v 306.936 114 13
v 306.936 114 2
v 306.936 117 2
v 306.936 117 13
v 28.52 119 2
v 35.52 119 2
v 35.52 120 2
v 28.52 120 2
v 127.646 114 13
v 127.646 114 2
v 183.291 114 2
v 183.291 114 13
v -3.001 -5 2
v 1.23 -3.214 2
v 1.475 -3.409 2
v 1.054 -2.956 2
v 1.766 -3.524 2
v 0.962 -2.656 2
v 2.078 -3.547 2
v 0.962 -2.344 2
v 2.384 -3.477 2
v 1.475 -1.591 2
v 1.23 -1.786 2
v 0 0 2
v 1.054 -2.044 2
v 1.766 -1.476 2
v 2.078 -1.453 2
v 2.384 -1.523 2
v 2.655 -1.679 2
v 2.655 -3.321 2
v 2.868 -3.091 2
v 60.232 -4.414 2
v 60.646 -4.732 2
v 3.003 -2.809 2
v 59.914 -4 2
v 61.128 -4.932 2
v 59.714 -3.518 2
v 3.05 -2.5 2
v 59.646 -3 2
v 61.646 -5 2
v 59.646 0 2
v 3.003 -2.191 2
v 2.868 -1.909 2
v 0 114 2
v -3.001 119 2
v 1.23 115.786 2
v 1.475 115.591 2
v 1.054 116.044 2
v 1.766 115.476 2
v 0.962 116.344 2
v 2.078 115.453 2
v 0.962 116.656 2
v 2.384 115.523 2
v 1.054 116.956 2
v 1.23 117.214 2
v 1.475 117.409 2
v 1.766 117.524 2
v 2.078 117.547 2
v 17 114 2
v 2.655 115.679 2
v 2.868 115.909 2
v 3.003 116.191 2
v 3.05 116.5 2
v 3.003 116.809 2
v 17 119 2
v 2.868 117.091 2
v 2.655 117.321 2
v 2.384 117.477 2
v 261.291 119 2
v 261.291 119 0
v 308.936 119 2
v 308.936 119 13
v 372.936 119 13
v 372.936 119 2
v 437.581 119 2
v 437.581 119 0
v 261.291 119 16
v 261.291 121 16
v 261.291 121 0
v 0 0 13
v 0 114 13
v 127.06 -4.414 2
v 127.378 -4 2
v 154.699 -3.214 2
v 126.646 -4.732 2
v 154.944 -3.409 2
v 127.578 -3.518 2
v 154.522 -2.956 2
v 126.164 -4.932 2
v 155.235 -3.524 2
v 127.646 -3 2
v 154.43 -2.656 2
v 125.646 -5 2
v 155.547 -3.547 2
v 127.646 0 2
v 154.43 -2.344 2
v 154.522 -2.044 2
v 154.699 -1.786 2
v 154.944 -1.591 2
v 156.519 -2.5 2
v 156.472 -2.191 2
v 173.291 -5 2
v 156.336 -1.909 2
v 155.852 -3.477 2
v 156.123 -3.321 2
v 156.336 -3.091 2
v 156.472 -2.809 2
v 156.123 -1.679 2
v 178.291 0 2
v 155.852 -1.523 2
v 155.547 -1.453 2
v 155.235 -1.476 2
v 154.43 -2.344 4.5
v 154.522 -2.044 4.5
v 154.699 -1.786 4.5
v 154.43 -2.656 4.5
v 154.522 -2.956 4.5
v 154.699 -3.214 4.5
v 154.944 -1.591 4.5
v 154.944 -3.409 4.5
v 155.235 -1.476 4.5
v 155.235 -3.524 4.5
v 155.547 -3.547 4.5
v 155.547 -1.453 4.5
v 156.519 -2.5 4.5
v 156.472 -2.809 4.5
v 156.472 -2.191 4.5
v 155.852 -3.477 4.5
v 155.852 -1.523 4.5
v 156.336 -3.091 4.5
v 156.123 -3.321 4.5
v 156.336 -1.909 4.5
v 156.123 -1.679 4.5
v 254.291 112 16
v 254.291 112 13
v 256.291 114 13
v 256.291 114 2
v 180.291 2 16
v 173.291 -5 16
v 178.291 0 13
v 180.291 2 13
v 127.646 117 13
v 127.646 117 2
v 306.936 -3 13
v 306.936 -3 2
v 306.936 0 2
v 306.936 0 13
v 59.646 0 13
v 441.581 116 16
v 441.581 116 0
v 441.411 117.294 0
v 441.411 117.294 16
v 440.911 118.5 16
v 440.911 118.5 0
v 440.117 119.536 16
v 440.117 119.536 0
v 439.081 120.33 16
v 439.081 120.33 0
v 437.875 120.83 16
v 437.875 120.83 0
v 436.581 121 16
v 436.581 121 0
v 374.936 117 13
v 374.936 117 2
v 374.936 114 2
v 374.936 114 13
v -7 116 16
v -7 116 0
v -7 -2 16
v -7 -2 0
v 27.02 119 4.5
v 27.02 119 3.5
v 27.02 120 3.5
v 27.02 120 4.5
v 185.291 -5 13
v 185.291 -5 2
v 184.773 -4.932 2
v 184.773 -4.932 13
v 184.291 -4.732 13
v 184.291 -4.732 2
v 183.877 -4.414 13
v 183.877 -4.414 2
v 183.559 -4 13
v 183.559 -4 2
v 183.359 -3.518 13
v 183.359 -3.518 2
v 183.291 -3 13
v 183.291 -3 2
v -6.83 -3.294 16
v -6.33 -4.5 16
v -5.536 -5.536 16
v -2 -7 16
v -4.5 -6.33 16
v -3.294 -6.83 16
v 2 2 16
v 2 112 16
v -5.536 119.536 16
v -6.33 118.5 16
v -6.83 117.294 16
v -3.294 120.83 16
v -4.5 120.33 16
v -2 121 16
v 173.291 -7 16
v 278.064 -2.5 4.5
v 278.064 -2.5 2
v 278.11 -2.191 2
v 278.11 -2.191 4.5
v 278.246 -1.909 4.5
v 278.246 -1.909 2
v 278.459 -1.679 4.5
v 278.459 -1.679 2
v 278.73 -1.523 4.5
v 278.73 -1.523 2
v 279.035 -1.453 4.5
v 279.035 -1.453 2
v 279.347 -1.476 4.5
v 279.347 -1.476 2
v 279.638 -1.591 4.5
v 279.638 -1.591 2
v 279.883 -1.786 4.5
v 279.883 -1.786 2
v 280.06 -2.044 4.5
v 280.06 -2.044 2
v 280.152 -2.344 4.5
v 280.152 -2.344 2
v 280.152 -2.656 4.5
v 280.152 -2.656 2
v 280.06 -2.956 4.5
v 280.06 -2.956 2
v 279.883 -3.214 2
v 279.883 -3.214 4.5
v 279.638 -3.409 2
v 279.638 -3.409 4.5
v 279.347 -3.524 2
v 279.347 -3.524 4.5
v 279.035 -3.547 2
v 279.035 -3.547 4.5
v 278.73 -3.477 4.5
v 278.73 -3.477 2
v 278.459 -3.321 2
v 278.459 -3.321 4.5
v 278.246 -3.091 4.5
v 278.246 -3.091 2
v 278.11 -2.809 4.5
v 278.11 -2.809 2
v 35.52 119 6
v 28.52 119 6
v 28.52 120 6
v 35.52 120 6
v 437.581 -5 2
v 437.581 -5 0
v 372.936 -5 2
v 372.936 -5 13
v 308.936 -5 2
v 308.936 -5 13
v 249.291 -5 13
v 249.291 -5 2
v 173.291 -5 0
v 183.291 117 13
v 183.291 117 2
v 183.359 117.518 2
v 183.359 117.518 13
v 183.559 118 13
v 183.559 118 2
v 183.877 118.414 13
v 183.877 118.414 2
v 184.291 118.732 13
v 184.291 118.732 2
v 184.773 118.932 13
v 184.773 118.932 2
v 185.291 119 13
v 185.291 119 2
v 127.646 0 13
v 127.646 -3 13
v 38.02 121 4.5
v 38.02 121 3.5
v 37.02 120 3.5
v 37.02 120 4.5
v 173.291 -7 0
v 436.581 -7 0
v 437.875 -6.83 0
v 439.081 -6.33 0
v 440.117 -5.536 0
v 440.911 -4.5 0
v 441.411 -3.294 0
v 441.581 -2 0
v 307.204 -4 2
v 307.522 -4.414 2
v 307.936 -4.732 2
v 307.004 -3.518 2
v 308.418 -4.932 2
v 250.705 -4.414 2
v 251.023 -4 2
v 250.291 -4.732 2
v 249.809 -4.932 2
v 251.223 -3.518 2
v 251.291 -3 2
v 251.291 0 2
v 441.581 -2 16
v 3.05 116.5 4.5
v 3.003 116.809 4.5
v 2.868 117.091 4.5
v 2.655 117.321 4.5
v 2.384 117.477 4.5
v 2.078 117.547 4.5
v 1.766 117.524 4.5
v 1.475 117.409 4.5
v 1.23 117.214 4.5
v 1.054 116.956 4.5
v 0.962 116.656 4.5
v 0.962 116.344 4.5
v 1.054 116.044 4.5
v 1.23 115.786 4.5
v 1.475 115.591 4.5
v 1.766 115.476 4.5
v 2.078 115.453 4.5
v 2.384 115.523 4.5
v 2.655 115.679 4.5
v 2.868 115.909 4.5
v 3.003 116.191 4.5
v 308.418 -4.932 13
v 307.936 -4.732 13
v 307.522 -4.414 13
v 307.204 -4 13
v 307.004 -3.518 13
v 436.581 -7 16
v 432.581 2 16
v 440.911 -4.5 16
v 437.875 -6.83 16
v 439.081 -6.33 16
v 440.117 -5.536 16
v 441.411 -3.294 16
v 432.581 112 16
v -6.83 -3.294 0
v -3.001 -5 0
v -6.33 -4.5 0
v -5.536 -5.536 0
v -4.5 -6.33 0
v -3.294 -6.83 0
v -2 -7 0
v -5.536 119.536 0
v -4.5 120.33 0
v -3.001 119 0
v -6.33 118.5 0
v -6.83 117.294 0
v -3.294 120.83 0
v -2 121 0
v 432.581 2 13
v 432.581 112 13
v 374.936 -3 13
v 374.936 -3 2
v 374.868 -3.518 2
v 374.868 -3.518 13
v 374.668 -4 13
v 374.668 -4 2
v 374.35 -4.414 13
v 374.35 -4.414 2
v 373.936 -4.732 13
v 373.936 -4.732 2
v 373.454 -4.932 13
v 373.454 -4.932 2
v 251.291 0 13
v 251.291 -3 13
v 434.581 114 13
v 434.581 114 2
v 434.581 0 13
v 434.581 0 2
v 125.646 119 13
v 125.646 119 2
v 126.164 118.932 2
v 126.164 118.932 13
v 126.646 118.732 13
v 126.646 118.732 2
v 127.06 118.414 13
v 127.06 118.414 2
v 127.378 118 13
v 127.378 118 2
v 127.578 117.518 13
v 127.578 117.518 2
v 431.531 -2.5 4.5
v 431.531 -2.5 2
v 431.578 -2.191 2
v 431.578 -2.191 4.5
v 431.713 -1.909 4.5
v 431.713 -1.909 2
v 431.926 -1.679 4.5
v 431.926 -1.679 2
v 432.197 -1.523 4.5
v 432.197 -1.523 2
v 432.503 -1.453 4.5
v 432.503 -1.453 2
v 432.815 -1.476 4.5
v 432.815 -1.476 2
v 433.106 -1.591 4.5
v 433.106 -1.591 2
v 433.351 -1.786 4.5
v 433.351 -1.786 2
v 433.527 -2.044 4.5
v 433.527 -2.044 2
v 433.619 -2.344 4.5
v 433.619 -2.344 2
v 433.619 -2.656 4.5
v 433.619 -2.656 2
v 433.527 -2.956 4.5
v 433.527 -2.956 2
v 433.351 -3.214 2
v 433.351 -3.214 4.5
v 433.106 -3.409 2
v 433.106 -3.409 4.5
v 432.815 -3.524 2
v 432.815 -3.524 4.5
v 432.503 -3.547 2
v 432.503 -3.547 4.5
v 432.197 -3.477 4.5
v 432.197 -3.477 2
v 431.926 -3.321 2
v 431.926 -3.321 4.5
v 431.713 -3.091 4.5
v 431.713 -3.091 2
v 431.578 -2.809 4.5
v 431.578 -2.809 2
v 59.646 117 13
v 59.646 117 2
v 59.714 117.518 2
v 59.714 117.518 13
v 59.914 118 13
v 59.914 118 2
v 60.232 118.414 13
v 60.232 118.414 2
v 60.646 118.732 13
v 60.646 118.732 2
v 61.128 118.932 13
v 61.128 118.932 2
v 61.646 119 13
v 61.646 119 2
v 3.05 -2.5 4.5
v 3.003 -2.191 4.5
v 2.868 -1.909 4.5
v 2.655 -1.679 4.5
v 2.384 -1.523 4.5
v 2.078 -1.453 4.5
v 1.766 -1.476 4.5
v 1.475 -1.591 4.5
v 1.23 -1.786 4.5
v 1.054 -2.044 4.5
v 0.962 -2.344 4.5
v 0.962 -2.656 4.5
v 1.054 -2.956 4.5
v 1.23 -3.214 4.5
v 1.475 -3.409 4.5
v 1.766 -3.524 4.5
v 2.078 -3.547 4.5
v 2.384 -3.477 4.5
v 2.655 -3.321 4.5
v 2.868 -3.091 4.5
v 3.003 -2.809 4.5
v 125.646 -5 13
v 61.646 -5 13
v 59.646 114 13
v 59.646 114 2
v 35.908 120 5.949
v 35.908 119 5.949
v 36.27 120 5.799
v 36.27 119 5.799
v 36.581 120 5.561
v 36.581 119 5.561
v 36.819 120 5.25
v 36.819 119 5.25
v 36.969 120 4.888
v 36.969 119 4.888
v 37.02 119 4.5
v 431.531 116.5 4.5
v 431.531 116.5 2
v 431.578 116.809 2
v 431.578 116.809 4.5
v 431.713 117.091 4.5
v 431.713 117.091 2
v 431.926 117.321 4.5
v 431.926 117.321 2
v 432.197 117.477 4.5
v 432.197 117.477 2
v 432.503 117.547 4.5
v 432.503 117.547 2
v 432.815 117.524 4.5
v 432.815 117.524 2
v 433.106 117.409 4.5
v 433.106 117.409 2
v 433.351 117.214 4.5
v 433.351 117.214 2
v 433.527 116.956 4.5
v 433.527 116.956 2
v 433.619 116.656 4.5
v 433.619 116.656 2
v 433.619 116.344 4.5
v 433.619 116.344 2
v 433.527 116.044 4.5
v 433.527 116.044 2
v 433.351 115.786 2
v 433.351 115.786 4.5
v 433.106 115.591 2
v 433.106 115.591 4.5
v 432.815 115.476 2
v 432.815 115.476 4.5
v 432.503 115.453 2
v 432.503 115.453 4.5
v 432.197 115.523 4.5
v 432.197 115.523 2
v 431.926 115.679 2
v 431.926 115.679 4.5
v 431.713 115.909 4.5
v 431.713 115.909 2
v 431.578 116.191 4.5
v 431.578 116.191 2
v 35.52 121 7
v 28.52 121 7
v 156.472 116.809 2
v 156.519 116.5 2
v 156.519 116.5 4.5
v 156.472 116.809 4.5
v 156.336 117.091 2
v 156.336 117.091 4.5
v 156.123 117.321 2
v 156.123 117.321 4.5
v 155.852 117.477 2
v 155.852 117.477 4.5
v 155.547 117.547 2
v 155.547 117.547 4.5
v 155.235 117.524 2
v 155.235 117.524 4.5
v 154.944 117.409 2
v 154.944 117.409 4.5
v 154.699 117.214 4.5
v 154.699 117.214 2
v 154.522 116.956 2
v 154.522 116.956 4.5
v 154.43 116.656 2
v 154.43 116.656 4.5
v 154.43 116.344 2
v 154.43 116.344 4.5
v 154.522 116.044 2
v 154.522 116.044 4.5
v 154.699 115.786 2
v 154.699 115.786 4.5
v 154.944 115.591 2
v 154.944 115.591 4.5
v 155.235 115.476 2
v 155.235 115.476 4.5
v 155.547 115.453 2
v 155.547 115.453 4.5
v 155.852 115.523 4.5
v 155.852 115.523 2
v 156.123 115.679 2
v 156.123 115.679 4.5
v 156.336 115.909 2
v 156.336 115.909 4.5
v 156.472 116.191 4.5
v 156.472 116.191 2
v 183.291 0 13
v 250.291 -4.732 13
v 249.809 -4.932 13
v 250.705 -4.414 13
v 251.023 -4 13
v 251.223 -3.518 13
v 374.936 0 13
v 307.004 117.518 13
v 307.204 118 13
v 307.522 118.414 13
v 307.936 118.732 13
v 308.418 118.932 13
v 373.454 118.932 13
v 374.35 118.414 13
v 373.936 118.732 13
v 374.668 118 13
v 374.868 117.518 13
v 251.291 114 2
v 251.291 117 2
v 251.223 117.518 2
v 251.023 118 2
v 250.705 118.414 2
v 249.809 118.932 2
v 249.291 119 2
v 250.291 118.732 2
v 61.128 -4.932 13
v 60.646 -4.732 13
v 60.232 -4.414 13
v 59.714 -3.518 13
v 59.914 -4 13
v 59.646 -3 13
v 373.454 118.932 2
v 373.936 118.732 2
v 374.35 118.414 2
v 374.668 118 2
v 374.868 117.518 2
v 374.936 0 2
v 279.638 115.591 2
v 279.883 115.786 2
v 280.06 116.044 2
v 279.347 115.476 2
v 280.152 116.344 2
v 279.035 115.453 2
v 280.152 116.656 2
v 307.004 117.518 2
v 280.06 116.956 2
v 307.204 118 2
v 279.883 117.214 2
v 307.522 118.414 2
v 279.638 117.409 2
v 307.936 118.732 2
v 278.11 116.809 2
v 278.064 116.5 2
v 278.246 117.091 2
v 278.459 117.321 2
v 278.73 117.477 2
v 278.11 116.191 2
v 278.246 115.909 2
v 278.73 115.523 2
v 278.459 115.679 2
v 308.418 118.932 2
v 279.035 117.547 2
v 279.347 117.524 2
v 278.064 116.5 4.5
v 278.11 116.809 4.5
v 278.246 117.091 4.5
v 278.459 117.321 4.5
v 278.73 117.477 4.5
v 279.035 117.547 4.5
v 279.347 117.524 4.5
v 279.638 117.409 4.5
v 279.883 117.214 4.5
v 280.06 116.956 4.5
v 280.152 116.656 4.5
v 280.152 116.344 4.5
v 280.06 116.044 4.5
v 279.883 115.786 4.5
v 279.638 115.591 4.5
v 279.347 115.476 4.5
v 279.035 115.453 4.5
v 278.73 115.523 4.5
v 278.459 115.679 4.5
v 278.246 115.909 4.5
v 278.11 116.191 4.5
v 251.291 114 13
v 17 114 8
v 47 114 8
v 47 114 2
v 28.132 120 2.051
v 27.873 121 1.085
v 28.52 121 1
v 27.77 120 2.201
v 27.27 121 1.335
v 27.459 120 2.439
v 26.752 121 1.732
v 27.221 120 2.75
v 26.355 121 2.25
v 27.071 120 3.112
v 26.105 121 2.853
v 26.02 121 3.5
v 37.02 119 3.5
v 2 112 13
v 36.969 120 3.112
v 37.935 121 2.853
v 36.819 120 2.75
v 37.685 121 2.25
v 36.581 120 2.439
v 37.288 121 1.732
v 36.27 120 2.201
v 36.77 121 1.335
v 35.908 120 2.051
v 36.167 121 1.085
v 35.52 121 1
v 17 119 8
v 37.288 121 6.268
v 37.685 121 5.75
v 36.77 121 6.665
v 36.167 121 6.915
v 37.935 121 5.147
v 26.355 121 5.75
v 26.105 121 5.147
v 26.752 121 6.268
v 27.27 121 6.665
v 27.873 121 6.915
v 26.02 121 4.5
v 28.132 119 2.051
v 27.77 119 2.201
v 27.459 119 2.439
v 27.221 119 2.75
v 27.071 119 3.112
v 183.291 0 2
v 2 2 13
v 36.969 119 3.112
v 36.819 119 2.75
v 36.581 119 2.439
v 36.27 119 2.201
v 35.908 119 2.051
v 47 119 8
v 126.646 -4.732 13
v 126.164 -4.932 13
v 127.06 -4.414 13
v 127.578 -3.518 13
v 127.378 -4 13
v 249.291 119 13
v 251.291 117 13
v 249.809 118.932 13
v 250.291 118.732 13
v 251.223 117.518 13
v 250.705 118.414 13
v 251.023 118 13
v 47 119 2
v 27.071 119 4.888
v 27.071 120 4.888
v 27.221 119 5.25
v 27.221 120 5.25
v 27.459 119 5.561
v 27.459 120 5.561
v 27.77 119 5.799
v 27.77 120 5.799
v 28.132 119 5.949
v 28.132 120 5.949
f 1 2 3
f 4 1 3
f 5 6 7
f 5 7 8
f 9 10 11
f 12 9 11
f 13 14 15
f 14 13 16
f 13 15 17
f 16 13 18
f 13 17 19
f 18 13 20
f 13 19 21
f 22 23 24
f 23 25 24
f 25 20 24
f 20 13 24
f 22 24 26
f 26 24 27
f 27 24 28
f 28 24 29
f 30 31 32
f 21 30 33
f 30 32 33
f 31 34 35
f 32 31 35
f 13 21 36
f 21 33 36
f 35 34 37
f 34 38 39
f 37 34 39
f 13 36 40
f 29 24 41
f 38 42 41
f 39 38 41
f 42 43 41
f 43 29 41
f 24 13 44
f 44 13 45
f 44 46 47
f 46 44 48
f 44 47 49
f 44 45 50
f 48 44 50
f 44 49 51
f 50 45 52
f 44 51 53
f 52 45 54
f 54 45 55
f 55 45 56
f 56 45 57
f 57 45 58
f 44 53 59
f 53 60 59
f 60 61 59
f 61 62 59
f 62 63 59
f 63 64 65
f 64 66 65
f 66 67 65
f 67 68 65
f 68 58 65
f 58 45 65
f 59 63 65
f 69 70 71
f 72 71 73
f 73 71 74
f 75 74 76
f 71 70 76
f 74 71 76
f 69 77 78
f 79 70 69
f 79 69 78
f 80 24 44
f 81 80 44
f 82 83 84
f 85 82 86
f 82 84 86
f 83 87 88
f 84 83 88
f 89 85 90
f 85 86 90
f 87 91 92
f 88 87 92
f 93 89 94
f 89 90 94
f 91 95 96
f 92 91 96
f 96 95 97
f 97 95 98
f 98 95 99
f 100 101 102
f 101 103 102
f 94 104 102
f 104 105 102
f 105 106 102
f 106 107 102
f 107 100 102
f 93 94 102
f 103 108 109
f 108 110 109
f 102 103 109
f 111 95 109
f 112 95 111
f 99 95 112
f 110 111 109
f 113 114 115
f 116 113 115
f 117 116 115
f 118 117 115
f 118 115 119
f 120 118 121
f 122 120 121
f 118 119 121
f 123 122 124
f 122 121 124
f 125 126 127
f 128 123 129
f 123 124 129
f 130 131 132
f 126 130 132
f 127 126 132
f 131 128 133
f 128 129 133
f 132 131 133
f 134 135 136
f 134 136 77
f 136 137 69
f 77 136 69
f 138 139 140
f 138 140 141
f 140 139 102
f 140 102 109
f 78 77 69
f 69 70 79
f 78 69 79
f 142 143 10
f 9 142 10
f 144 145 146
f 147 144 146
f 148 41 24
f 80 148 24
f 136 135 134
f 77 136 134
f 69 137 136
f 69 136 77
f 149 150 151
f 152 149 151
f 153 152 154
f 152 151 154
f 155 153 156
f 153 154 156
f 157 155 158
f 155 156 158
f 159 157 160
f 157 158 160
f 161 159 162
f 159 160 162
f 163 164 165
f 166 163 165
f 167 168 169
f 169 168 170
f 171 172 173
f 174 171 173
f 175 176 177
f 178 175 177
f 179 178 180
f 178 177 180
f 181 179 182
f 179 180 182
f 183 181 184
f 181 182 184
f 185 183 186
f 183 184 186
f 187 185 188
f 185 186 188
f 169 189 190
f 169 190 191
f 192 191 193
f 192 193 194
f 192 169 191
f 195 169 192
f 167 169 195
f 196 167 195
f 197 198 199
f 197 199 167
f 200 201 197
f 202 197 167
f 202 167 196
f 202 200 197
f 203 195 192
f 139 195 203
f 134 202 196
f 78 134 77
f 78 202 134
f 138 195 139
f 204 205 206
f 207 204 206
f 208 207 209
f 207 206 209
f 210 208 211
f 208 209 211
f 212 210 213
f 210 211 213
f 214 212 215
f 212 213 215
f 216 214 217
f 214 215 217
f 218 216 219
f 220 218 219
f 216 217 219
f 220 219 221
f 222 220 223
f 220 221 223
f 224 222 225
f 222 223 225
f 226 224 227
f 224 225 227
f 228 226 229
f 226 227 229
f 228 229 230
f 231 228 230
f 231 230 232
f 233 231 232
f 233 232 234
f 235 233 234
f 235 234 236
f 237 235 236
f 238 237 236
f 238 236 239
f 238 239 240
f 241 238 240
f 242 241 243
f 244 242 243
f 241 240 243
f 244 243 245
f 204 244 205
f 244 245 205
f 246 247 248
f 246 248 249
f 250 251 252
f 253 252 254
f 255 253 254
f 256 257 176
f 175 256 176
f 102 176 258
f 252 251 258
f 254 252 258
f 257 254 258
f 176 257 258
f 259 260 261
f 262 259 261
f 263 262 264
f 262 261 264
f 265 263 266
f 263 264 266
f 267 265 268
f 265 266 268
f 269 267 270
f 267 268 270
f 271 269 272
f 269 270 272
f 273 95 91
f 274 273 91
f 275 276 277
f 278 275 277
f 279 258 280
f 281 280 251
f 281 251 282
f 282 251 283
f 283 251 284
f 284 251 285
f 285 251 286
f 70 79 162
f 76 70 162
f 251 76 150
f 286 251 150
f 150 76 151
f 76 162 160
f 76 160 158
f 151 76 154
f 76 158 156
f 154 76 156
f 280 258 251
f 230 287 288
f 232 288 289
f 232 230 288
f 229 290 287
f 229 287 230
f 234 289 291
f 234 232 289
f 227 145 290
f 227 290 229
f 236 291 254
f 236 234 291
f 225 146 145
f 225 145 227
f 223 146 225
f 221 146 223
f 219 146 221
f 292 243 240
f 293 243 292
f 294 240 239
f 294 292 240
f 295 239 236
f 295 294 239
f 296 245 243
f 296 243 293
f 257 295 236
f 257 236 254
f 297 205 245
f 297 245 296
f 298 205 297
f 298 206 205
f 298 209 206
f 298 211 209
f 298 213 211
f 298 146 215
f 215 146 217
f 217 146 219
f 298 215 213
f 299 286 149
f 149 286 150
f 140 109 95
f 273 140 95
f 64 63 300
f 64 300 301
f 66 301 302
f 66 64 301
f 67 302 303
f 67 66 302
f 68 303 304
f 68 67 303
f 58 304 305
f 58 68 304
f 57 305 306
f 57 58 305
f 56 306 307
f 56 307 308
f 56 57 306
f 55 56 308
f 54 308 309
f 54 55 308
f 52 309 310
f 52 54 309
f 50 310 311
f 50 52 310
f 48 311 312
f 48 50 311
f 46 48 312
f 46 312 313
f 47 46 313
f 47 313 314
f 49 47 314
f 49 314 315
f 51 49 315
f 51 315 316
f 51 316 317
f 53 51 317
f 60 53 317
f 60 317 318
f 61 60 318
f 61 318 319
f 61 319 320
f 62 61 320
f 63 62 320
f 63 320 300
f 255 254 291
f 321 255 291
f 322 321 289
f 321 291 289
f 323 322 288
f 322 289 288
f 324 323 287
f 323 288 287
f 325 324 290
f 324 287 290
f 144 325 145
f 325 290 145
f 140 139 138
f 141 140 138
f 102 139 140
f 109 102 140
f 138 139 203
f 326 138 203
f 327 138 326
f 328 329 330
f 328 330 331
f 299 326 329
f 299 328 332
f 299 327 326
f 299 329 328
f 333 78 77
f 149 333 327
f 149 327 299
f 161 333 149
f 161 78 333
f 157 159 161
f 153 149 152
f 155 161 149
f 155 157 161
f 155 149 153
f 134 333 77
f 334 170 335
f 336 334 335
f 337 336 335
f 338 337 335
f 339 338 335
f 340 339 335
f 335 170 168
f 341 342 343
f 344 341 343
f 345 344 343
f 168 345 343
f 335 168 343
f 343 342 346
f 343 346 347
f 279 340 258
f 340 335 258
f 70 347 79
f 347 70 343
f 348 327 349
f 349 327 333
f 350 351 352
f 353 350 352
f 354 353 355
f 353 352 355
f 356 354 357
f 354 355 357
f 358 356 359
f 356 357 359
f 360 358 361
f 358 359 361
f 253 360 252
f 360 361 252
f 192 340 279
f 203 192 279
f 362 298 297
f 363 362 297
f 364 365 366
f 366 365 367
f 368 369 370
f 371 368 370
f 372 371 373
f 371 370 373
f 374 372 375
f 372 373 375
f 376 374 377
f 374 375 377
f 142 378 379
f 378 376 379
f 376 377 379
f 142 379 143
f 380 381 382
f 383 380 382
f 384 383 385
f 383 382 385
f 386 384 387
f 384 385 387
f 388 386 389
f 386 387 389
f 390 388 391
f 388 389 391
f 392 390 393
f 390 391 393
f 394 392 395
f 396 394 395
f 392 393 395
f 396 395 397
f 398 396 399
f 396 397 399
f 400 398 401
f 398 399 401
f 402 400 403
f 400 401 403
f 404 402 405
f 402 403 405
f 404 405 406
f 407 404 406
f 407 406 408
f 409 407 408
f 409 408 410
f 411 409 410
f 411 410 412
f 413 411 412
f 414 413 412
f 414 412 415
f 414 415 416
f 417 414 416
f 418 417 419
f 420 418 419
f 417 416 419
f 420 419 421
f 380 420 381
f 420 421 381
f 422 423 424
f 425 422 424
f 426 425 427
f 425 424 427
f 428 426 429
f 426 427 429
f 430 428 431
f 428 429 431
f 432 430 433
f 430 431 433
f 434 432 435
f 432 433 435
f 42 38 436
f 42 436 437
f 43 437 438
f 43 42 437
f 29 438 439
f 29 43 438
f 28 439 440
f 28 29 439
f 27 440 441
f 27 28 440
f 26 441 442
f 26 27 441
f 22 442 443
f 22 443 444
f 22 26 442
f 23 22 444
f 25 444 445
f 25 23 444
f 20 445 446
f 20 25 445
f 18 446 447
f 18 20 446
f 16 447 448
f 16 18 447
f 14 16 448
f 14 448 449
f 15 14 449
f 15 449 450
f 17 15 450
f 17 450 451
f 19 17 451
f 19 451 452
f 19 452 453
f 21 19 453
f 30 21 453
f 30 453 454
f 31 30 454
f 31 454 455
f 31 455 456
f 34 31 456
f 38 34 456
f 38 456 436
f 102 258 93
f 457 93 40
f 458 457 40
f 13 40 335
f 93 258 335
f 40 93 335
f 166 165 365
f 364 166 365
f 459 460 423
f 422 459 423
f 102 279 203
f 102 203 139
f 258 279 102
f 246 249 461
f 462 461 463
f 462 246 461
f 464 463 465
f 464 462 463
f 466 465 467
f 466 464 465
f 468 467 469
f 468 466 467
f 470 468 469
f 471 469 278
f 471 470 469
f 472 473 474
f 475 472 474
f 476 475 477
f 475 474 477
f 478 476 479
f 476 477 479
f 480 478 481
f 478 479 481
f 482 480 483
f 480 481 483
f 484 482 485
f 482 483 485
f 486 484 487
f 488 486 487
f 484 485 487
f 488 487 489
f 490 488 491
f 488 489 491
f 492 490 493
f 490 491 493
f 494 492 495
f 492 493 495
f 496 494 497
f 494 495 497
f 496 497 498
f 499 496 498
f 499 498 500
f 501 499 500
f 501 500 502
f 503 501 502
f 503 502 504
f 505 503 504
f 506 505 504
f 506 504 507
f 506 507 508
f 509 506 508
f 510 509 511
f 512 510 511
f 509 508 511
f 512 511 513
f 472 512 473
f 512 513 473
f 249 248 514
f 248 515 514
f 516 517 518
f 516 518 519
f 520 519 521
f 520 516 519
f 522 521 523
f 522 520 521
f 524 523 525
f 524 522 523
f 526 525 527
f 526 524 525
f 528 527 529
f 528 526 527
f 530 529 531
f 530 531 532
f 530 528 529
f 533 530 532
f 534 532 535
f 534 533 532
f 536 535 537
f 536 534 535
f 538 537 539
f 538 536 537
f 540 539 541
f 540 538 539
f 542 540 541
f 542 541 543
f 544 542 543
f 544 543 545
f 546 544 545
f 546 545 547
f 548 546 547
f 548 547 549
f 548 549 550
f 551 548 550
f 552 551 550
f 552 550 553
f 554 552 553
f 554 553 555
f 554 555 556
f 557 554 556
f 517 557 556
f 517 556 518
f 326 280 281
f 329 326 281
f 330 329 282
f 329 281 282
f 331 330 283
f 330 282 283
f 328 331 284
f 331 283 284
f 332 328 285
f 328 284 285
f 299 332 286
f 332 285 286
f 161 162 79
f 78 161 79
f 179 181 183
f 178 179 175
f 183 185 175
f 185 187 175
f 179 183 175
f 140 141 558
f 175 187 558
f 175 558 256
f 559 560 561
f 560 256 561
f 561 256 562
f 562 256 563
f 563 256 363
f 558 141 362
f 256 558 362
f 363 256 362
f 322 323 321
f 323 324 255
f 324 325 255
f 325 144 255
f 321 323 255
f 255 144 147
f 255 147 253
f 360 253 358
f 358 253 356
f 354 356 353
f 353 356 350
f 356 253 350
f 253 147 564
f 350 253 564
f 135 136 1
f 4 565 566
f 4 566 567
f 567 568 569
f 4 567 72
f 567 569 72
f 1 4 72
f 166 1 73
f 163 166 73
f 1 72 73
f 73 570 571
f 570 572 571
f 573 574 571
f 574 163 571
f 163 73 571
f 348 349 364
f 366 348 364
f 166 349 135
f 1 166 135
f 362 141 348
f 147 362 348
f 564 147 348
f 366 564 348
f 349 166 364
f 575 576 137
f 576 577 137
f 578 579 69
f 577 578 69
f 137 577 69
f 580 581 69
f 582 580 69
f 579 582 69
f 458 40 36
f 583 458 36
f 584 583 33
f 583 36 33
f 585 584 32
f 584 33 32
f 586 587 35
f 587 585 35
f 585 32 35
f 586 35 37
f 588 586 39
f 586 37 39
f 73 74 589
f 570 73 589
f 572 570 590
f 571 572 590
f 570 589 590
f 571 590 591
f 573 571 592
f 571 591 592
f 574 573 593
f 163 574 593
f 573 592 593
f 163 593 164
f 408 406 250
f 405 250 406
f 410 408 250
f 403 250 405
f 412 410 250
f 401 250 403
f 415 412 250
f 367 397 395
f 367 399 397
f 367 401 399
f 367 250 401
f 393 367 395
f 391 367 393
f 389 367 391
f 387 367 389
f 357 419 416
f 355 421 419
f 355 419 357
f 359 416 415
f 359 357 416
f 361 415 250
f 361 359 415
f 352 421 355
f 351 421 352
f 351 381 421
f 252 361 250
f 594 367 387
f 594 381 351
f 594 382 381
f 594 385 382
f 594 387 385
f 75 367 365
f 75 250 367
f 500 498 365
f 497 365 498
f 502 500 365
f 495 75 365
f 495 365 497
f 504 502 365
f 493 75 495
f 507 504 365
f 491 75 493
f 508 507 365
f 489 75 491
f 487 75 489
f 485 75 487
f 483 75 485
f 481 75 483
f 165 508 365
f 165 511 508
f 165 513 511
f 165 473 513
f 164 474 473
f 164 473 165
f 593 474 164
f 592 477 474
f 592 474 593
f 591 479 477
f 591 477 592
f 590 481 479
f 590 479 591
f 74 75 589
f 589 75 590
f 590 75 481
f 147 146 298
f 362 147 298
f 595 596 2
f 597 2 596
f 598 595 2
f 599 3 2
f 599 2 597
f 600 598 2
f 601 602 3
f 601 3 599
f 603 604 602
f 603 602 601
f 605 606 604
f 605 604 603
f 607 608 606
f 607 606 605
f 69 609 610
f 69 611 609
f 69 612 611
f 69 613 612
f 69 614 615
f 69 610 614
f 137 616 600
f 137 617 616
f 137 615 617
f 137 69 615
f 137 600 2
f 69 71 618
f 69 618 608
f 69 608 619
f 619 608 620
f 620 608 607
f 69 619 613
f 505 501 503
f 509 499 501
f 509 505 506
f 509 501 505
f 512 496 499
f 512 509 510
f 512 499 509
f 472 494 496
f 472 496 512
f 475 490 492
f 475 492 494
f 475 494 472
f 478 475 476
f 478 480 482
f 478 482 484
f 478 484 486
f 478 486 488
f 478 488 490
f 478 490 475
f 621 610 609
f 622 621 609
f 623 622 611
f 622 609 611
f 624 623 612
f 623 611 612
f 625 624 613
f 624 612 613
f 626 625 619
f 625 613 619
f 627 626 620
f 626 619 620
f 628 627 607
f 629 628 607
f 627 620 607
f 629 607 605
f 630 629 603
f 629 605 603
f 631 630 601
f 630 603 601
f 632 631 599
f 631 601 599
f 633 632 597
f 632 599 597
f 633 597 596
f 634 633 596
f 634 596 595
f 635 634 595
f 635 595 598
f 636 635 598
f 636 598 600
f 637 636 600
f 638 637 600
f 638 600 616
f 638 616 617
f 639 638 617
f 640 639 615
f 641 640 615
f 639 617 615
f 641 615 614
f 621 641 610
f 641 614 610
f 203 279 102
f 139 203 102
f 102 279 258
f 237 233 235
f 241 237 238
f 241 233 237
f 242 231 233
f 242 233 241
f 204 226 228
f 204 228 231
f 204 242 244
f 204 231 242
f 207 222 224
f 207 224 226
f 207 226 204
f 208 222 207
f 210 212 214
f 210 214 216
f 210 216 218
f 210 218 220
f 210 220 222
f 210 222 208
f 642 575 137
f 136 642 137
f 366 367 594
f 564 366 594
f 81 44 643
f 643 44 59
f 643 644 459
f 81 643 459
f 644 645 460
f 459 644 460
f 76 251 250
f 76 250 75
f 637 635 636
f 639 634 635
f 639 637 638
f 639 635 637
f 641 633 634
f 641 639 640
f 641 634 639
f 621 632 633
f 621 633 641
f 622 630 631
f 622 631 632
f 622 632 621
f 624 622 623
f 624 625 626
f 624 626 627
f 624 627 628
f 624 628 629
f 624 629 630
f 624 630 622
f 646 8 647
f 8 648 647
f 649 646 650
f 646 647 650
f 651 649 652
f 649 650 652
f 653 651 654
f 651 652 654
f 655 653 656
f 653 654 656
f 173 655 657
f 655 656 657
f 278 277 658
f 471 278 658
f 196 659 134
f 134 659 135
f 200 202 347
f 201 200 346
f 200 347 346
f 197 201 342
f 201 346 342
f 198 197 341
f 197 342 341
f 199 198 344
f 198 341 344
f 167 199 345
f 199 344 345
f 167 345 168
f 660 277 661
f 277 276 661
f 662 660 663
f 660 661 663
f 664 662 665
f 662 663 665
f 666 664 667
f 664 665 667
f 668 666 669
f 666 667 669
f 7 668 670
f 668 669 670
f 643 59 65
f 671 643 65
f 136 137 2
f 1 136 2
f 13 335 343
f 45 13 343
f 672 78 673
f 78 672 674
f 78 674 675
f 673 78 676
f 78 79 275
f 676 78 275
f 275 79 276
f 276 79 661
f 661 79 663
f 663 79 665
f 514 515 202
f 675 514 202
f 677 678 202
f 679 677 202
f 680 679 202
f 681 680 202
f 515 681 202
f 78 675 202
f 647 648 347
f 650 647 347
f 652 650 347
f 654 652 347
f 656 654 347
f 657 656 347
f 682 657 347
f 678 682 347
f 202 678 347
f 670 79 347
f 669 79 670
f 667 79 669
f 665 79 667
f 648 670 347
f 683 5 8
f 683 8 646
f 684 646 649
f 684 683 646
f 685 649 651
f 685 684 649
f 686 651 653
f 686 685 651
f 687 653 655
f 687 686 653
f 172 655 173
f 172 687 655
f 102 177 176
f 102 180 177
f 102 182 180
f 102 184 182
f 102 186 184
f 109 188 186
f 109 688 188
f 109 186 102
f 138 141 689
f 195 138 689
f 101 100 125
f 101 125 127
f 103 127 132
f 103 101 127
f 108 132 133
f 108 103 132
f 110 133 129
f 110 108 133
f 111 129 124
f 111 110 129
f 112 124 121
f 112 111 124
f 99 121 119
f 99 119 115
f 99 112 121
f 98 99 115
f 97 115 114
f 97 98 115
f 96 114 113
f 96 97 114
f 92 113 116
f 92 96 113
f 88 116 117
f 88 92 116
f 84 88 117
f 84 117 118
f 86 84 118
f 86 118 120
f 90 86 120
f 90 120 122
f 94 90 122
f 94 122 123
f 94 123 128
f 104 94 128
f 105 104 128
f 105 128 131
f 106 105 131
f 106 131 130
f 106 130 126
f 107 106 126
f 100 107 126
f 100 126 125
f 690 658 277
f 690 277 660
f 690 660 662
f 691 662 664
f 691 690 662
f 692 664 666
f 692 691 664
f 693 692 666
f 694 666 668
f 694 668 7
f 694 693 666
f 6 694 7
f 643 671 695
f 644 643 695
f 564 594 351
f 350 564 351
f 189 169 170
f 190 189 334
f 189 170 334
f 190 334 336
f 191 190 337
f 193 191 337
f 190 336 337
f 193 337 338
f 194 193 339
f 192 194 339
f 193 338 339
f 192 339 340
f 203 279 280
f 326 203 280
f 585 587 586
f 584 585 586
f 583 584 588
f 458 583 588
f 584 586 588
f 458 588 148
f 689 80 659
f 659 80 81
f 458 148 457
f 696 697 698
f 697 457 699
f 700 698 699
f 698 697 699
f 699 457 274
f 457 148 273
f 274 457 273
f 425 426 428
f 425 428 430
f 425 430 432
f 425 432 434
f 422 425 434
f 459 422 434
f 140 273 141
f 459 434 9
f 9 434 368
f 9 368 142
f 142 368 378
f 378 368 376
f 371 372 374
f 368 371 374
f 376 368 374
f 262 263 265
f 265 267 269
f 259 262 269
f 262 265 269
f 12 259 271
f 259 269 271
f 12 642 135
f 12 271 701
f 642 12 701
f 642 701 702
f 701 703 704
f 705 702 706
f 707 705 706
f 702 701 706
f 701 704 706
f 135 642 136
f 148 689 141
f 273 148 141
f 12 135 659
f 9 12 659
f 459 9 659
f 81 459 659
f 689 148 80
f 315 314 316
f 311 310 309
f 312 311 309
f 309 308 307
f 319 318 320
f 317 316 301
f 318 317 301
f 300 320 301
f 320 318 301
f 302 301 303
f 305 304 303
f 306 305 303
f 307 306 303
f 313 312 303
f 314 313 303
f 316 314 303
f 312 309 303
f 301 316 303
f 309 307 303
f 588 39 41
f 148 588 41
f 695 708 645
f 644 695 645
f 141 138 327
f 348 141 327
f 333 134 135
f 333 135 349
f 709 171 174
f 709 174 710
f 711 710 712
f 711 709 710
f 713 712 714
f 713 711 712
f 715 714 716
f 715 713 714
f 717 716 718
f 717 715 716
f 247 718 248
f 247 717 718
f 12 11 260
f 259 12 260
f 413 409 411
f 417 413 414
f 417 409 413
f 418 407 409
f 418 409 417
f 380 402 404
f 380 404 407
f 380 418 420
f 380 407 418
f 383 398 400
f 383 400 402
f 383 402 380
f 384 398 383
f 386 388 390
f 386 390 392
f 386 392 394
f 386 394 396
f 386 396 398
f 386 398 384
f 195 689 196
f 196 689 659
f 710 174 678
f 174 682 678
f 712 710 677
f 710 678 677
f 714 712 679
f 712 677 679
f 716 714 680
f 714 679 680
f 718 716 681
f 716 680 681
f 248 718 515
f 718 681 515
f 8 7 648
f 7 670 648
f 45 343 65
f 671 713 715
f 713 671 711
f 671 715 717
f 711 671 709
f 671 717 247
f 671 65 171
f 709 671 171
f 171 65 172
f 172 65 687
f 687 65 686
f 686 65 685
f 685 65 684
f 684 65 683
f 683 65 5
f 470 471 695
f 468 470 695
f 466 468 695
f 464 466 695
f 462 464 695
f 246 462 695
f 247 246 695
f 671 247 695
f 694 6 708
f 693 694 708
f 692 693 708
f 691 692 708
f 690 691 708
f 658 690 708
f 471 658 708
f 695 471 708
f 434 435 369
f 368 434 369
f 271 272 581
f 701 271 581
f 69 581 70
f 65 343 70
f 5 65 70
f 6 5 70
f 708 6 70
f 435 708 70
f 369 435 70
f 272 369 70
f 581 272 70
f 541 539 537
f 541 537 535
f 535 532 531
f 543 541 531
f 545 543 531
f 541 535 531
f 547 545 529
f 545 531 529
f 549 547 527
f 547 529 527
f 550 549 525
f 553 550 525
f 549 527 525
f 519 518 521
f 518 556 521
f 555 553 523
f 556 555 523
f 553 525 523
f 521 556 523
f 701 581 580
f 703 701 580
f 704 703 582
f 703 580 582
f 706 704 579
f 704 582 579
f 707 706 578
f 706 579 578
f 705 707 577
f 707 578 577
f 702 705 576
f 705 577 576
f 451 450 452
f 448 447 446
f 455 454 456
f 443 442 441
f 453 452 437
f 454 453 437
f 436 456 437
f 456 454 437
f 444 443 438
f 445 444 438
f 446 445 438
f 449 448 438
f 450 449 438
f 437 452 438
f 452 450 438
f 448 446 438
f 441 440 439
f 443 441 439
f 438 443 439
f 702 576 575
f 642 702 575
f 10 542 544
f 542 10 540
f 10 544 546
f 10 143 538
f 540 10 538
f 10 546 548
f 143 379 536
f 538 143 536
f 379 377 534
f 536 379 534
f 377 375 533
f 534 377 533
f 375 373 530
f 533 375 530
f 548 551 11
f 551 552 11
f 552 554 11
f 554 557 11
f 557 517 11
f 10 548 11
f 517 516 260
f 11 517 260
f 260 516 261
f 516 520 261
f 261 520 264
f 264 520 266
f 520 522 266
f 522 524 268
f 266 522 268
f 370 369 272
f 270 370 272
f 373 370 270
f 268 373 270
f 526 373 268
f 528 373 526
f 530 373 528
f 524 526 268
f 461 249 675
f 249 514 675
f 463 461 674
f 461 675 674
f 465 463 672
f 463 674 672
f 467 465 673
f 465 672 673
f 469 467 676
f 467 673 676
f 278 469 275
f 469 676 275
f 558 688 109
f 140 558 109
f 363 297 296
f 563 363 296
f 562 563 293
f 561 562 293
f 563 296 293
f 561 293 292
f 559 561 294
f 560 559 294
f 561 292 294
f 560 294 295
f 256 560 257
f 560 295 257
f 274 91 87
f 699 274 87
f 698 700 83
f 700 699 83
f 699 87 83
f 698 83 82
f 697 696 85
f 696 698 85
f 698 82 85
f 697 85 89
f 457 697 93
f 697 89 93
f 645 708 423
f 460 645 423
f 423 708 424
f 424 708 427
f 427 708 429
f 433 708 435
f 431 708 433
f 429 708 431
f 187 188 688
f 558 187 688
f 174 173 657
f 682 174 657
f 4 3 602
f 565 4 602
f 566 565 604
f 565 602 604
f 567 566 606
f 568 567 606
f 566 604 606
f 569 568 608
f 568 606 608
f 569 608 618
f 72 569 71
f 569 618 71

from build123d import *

# Parameters (mm, degrees)
BOSS_EXTRUDE1_DEPTH = 16
SKETCH2_W           = 438.581
SKETCH2_H           = 128
SKETCH2_W_2         = 430.581
SKETCH2_H_2         = 110
BOSS_EXTRUDE2_DEPTH = 3
SKETCH3_W           = 440.5822769
SKETCH3_H           = 124
CUT_EXTRUDE1_DEPTH  = 2
SKETCH4_R           = 1.05
CUT_EXTRUDE2_DEPTH  = 2.5
SKETCH5_W           = 30
SKETCH5_H           = 5
CUT_EXTRUDE3_DEPTH  = 6
CUT_EXTRUDE4_DEPTH  = 4
CHAMFER8_SIZE       = 1
SPLIT1_DEPTH        = 16
SPLIT1_START        = 2
SPLIT1_2_OUTLINE_R  = 1.05
SPLIT1_2_DEPTH      = 14
SPLIT1_START_2      = 13
SPLIT1_3_OUTLINE_R  = 1.05
SPLIT1_3_DEPTH      = 3
SPLIT1_4_DEPTH      = 3.5
SPLIT1_START_3      = 8
SPLIT1_5_OUTLINE_R  = 1.05
SPLIT1_5_DEPTH      = 5
SPLIT1_START_4      = 4.5
SPLIT1_6_OUTLINE_R  = 1.05
SPLIT1_6_DEPTH      = 3.5
SPLIT1_START_5      = 118
SPLIT1_7_DEPTH      = 4


with BuildPart() as part:
    # Sketch1 → Boss-Extrude1 (new body)
    with BuildSketch(Plane.XY):
        with BuildLine():
            ThreePointArc((-7, -2), (-5.535533906, -5.535533906), (-2, -7))
            Line((-2, -7), (436.581, -7))
            ThreePointArc((436.581, -7), (440.116533906, -5.535533906), (441.581, -2))
            Line((441.581, -2), (441.581, 116))
            ThreePointArc((441.581, 116), (440.116533906, 119.535533906), (436.581, 121))
            Line((436.581, 121), (-2, 121))
            ThreePointArc((-2, 121), (-5.535533906, 119.535533906), (-7, 116))
            Line((-7, 116), (-7, -2))
        make_face()
        with BuildLine():
            Line((251.291, 114), (306.936, 114))
            Line((306.936, 114), (306.936, 117))
            ThreePointArc((306.936, 117), (307.521786438, 118.414213562), (308.936, 119))
            Line((308.936, 119), (372.936, 119))
            ThreePointArc((372.936, 119), (374.350213562, 118.414213562), (374.936, 117))
            Line((374.936, 117), (374.936, 114))
            Line((374.936, 114), (434.581, 114))
            Line((434.581, 114), (434.581, 0))
            Line((434.581, 0), (374.936, 0))
            Line((374.936, 0), (374.936, -3))
            ThreePointArc((374.936, -3), (374.350213562, -4.414213562), (372.936, -5))
            Line((372.936, -5), (308.936, -5))
            ThreePointArc((308.936, -5), (307.521786438, -4.414213562), (306.936, -3))
            Line((306.936, -3), (306.936, 0))
            Line((306.936, 0), (251.291, 0))
            Line((251.291, 0), (251.291, -3))
            ThreePointArc((251.291, -3), (250.705213562, -4.414213562), (249.291, -5))
            Line((249.291, -5), (185.291, -5))
            ThreePointArc((185.291, -5), (183.876786438, -4.414213562), (183.291, -3))
            Line((183.291, -3), (183.291, 0))
            Line((183.291, 0), (127.646, 0))
            Line((127.646, 0), (127.646, -3))
            ThreePointArc((127.646, -3), (127.060213562, -4.414213562), (125.646, -5))
            Line((125.646, -5), (61.646, -5))
            ThreePointArc((61.646, -5), (60.231786438, -4.414213562), (59.646, -3))
            Line((59.646, -3), (59.646, 0))
            Line((59.646, 0), (0, 0))
            Line((0, 0), (0, 114))
            Line((0, 114), (59.646, 114))
            Line((59.646, 114), (59.646, 117))
            ThreePointArc((59.646, 117), (60.231786438, 118.414213562), (61.646, 119))
            Line((61.646, 119), (125.646, 119))
            ThreePointArc((125.646, 119), (127.060213562, 118.414213562), (127.646, 117))
            Line((127.646, 117), (127.646, 114))
            Line((127.646, 114), (183.291, 114))
            Line((183.291, 114), (183.291, 117))
            ThreePointArc((183.291, 117), (183.876786438, 118.414213562), (185.291, 119))
            Line((185.291, 119), (249.291, 119))
            ThreePointArc((249.291, 119), (250.705213562, 118.414213562), (251.291, 117))
            Line((251.291, 117), (251.291, 114))
        make_face(mode=Mode.SUBTRACT)
    extrude(amount=BOSS_EXTRUDE1_DEPTH)

    # Sketch2 → Boss-Extrude2 (add)
    with BuildSketch(Plane.XY.offset(16)):
        with Locations((217.2905, 57)):
            Rectangle(SKETCH2_W, SKETCH2_H)
        with Locations((217.2905, 57)):
            Rectangle(SKETCH2_W_2, SKETCH2_H_2, mode=Mode.SUBTRACT)
    extrude(amount=-BOSS_EXTRUDE2_DEPTH)

    # Sketch3 → Cut-Extrude1 (cut)
    with BuildSketch(Plane(origin=(0, 0, 0), x_dir=(-1, 0, 0), z_dir=(0, 0, -1))):
        with Locations((-217.28986155, 57)):
            Rectangle(SKETCH3_W, SKETCH3_H)
    extrude(amount=-CUT_EXTRUDE1_DEPTH, mode=Mode.SUBTRACT)

    # Sketch4 → Cut-Extrude2 (cut)
    with BuildSketch(Plane(origin=(0, 0, 2), x_dir=(-1, 0, 0), z_dir=(0, 0, -1))):
        with Locations((-279.1135, 116.5)):
            Circle(SKETCH4_R)
        with Locations((-155.4685, 116.5)):
            Circle(SKETCH4_R)
        with Locations((-279.1135, -2.5)):
            Circle(SKETCH4_R)
        with Locations((-155.4685, -2.5)):
            Circle(SKETCH4_R)
        with Locations((-2, -2.5)):
            Circle(SKETCH4_R)
        with Locations((-2, 116.5)):
            Circle(SKETCH4_R)
        with Locations((-432.581, 116.5)):
            Circle(SKETCH4_R)
        with Locations((-432.581, -2.5)):
            Circle(SKETCH4_R)
    extrude(amount=-CUT_EXTRUDE2_DEPTH, mode=Mode.SUBTRACT)

    # Sketch5 → Cut-Extrude3 (cut)
    with BuildSketch(Plane(origin=(0, 0, 2), x_dir=(-1, 0, 0), z_dir=(0, 0, -1))):
        with Locations((-32, 116.5)):
            Rectangle(SKETCH5_W, SKETCH5_H)
    extrude(amount=-CUT_EXTRUDE3_DEPTH, mode=Mode.SUBTRACT)

    # Sketch6 → Cut-Extrude4 (cut)
    with BuildSketch(Plane.XZ.offset(-119)):
        with BuildLine():
            Line((35.52, 2), (28.52, 2))
            ThreePointArc((28.52, 2), (27.459339828, 2.439339828), (27.02, 3.5))
            Line((27.02, 3.5), (27.02, 4.5))
            ThreePointArc((27.02, 4.5), (27.459339828, 5.560660172), (28.52, 6))
            Line((28.52, 6), (35.52, 6))
            ThreePointArc((35.52, 6), (36.580660172, 5.560660172), (37.02, 4.5))
            Line((37.02, 4.5), (37.02, 3.5))
            ThreePointArc((37.02, 3.5), (36.580660172, 2.439339828), (35.52, 2))
        make_face()
    extrude(amount=-CUT_EXTRUDE4_DEPTH, mode=Mode.SUBTRACT)

    # Chamfer8
    chamfer8_edges = [part.edges().sort_by_distance(p)[0] for p in [
        (32.02, 121, 6),
        (27.459339828, 121, 5.560660172),
        (27.02, 121, 4),
        (27.459339828, 121, 2.439339828),
        (32.02, 121, 2),
        (36.580660172, 121, 2.439339828),
        (37.02, 121, 4),
        (36.580660172, 121, 5.560660172),
    ]]
    chamfer(chamfer8_edges, length=CHAMFER8_SIZE)

    # Split1: read off the stored shape, not the designer's step
    # Split1 outline → Split1 (cut)
    with BuildSketch(Plane.XY):
        with BuildLine():
            Line((261.291, 121), (-2, 121))
            ThreePointArc((-2, 121), (-5.535533906, 119.535533906), (-7, 116))
            Line((-7, 116), (-7, -2))
            ThreePointArc((-7, -2), (-5.535533906, -5.535533906), (-2, -7))
            Line((-2, -7), (173.291, -7))
            Line((173.291, -7), (173.291, -5))
            Line((173.291, -5), (180.291, 2))
            Line((180.291, 2), (2, 2))
            Line((2, 2), (2, 112))
            Line((2, 112), (254.291, 112))
            Line((254.291, 112), (261.291, 119))
            Line((261.291, 119), (261.291, 121))
        make_face()
    extrude(amount=SPLIT1_DEPTH, mode=Mode.SUBTRACT)


with BuildPart() as body_2:
    # Split1 2 outline → Split1 2 (new body)
    # profile 1 of 2: a face of its own
    with BuildSketch(Plane.XY.offset(SPLIT1_START)):
        with BuildLine():
            ThreePointArc((127.646, -3), (127.060213562, -4.414213562), (125.646, -5))
            Line((125.646, -5), (61.646, -5))
            ThreePointArc((61.646, -5), (60.231786438, -4.414213562), (59.646, -3))
            Line((59.646, -3), (59.646, 0))
            Line((59.646, 0), (0, 0))
            Line((0, 0), (0, 114))
            Line((0, 114), (17, 114))
            Line((17, 114), (17, 119))
            Line((17, 119), (27.02, 119))
            Line((27.02, 119), (27.02, 120))
            Line((27.02, 120), (26.02, 121))
            Line((26.02, 121), (-2, 121))
            ThreePointArc((-2, 121), (-5.535533906, 119.535533906), (-7, 116))
            Line((-7, 116), (-7, -2))
            ThreePointArc((-7, -2), (-5.535533906, -5.535533906), (-2, -7))
            Line((-2, -7), (173.291, -7))
            Line((173.291, -7), (173.291, -5))
            Line((173.291, -5), (178.291, 0))
            Line((178.291, 0), (127.646, 0))
            Line((127.646, 0), (127.646, -3))
        make_face()
        with Locations((155.4685, -2.5)):
            Circle(SPLIT1_2_OUTLINE_R, mode=Mode.SUBTRACT)
        with Locations((2, -2.5)):
            Circle(SPLIT1_2_OUTLINE_R, mode=Mode.SUBTRACT)
        with Locations((2, 116.5)):
            Circle(SPLIT1_2_OUTLINE_R, mode=Mode.SUBTRACT)
    # profile 2 of 2: a face of its own
    with BuildSketch(Plane.XY.offset(SPLIT1_START)):
        with BuildLine():
            Line((251.291, 114), (256.291, 114))
            Line((256.291, 114), (261.291, 119))
            Line((261.291, 119), (261.291, 121))
            Line((261.291, 121), (38.02, 121))
            Line((38.02, 121), (37.02, 120))
            Line((37.02, 120), (37.02, 119))
            Line((37.02, 119), (47, 119))
            Line((47, 119), (47, 114))
            Line((47, 114), (59.646, 114))
            Line((59.646, 114), (59.646, 117))
            ThreePointArc((59.646, 117), (60.231786438, 118.414213562), (61.646, 119))
            Line((61.646, 119), (125.646, 119))
            ThreePointArc((125.646, 119), (127.060213562, 118.414213562), (127.646, 117))
            Line((127.646, 117), (127.646, 114))
            Line((127.646, 114), (183.291, 114))
            Line((183.291, 114), (183.291, 117))
            ThreePointArc((183.291, 117), (183.876786438, 118.414213562), (185.291, 119))
            Line((185.291, 119), (249.291, 119))
            ThreePointArc((249.291, 119), (250.705213562, 118.414213562), (251.291, 117))
            Line((251.291, 117), (251.291, 114))
        make_face()
        with Locations((155.4685, 116.5)):
            Circle(SPLIT1_2_OUTLINE_R, mode=Mode.SUBTRACT)
    extrude(amount=SPLIT1_2_DEPTH)

    # Split1 3 outline → Split1 3 (add)
    with BuildSketch(Plane.XY.offset(SPLIT1_START_2)):
        with BuildLine():
            Line((127.646, 0), (178.291, 0))
            Line((178.291, 0), (180.291, 2))
            Line((180.291, 2), (2, 2))
            Line((2, 2), (2, 112))
            Line((2, 112), (254.291, 112))
            Line((254.291, 112), (256.291, 114))
            Line((256.291, 114), (251.291, 114))
            Line((251.291, 114), (251.291, 117))
            ThreePointArc((251.291, 117), (250.705213562, 118.414213562), (249.291, 119))
            Line((249.291, 119), (185.291, 119))
            ThreePointArc((185.291, 119), (183.876786438, 118.414213562), (183.291, 117))
            Line((183.291, 117), (183.291, 114))
            Line((183.291, 114), (127.646, 114))
            Line((127.646, 114), (127.646, 117))
            ThreePointArc((127.646, 117), (127.060213562, 118.414213562), (125.646, 119))
            Line((125.646, 119), (61.646, 119))
            ThreePointArc((61.646, 119), (60.231786438, 118.414213562), (59.646, 117))
            Line((59.646, 117), (59.646, 114))
            Line((59.646, 114), (47, 114))
            Line((47, 114), (47, 119))
            Line((47, 119), (37.02, 119))
            Line((37.02, 119), (37.02, 120))
            Line((37.02, 120), (38.02, 121))
            Line((38.02, 121), (26.02, 121))
            Line((26.02, 121), (27.02, 120))
            Line((27.02, 120), (27.02, 119))
            Line((27.02, 119), (17, 119))
            Line((17, 119), (17, 114))
            Line((17, 114), (0, 114))
            Line((0, 114), (0, 0))
            Line((0, 0), (59.646, 0))
            Line((59.646, 0), (59.646, -3))
            ThreePointArc((59.646, -3), (60.231786438, -4.414213562), (61.646, -5))
            Line((61.646, -5), (125.646, -5))
            ThreePointArc((125.646, -5), (127.060213562, -4.414213562), (127.646, -3))
            Line((127.646, -3), (127.646, 0))
        make_face()
        with Locations((155.4685, 116.5)):
            Circle(SPLIT1_3_OUTLINE_R)
        with Locations((2, 116.5)):
            Circle(SPLIT1_3_OUTLINE_R)
        with Locations((2, -2.5)):
            Circle(SPLIT1_3_OUTLINE_R)
        with Locations((155.4685, -2.5)):
            Circle(SPLIT1_3_OUTLINE_R)
    extrude(amount=SPLIT1_3_DEPTH)

    # Split1 4 outline → Split1 4 (add)
    with BuildSketch(Plane.XY):
        with BuildLine():
            Line((173.291, -7), (173.291, -5))
            Line((173.291, -5), (-3.0012769, -5))
            Line((-3.0012769, -5), (-3.0012769, 119))
            Line((-3.0012769, 119), (261.291, 119))
            Line((261.291, 119), (261.291, 121))
            Line((261.291, 121), (-2, 121))
            ThreePointArc((-2, 121), (-5.535533906, 119.535533906), (-7, 116))
            Line((-7, 116), (-7, -2))
            ThreePointArc((-7, -2), (-5.535533906, -5.535533906), (-2, -7))
            Line((-2, -7), (173.291, -7))
        make_face()
    extrude(amount=SPLIT1_4_DEPTH)

    # Split1 5 outline → Split1 5 (add)
    with BuildSketch(Plane.XY.offset(SPLIT1_START_3)):
        Polygon((27.02, 119), (17, 119), (17, 114), (47, 114), (47, 119), (37.02, 119), (37.02, 120), (38.02, 121), (26.02, 121), (27.02, 120), align=None)
        with Locations((155.4685, 116.5)):
            Circle(SPLIT1_5_OUTLINE_R)
        with Locations((2, 116.5)):
            Circle(SPLIT1_5_OUTLINE_R)
        with Locations((2, -2.5)):
            Circle(SPLIT1_5_OUTLINE_R)
        with Locations((155.4685, -2.5)):
            Circle(SPLIT1_5_OUTLINE_R)
    extrude(amount=SPLIT1_5_DEPTH)

    # Split1 6 outline → Split1 6 (add)
    with BuildSketch(Plane.XY.offset(SPLIT1_START_4)):
        Polygon((38.02, 121), (26.02, 121), (27.02, 120), (27.02, 119), (37.02, 119), (37.02, 120), align=None)
        with Locations((155.4685, 116.5)):
            Circle(SPLIT1_6_OUTLINE_R)
        with Locations((2, 116.5)):
            Circle(SPLIT1_6_OUTLINE_R)
        with Locations((2, -2.5)):
            Circle(SPLIT1_6_OUTLINE_R)
        with Locations((155.4685, -2.5)):
            Circle(SPLIT1_6_OUTLINE_R)
    extrude(amount=SPLIT1_6_DEPTH)

    # Split1 7 outline → Split1 7 (cut)
    with BuildSketch(Plane(origin=(0, 0, 0), x_dir=(1, 0, 0), z_dir=(0, 1, 0)).offset(SPLIT1_START_5)):
        with BuildLine():
            ThreePointArc((27.02, -4.5), (27.459339828, -5.560660172), (28.52, -6))
            Line((28.52, -6), (35.52, -6))
            ThreePointArc((35.52, -6), (36.580660172, -5.560660172), (37.02, -4.5))
            Line((37.02, -4.5), (27.02, -4.5))
        make_face()
        with BuildLine():
            ThreePointArc((28.52, -2), (27.459339828, -2.439339828), (27.02, -3.5))
            Line((27.02, -3.5), (37.02, -3.5))
            ThreePointArc((37.02, -3.5), (36.580660172, -2.439339828), (35.52, -2))
            Line((35.52, -2), (28.52, -2))
        make_face()
    extrude(amount=SPLIT1_7_DEPTH, mode=Mode.SUBTRACT)

    # Split1 8: loft between two sections, ruled curve by curve
    split1_8_from = [
        Edge.make_three_point_arc((27.02, 120, 4.5), (27.459339828, 120, 5.560660172), (28.52, 120, 6)),
        Edge.make_three_point_arc((35.52, 120, 6), (36.580660172, 120, 5.560660172), (37.02, 120, 4.5)),
        Edge.make_line((28.52, 120, 6), (35.52, 120, 6)),
        Edge.make_line((37.02, 120, 4.5), (27.02, 120, 4.5)),
    ]
    split1_8_to = [
        Edge.make_three_point_arc((26.02, 121, 4.5), (26.752233047, 121, 6.267766953), (28.52, 121, 7)),
        Edge.make_three_point_arc((35.52, 121, 7), (37.287766953, 121, 6.267766953), (38.02, 121, 4.5)),
        Edge.make_line((28.52, 121, 7), (35.52, 121, 7)),
        Edge.make_line((38.02, 121, 4.5), (26.02, 121, 4.5)),
    ]
    split1_8 = Solid(Shell([*[Face.make_surface_from_curves(split1_8_from[k], split1_8_to[k]) for k in range(4)], Face(Wire(split1_8_from)), Face(Wire(split1_8_to))]))
    add(split1_8, mode=Mode.SUBTRACT)

    # Split1 9: loft between two sections, ruled curve by curve
    split1_9_from = [
        Edge.make_three_point_arc((37.02, 120, 3.5), (36.580660172, 120, 2.439339828), (35.52, 120, 2)),
        Edge.make_three_point_arc((28.52, 120, 2), (27.459339828, 120, 2.439339828), (27.02, 120, 3.5)),
        Edge.make_line((35.52, 120, 2), (28.52, 120, 2)),
        Edge.make_line((27.02, 120, 3.5), (37.02, 120, 3.5)),
    ]
    split1_9_to = [
        Edge.make_three_point_arc((38.02, 121, 3.5), (37.287766953, 121, 1.732233047), (35.52, 121, 1)),
        Edge.make_three_point_arc((28.52, 121, 1), (26.752233047, 121, 1.732233047), (26.02, 121, 3.5)),
        Edge.make_line((35.52, 121, 1), (28.52, 121, 1)),
        Edge.make_line((26.02, 121, 3.5), (38.02, 121, 3.5)),
    ]
    split1_9 = Solid(Shell([*[Face.make_surface_from_curves(split1_9_from[k], split1_9_to[k]) for k in range(4)], Face(Wire(split1_9_from)), Face(Wire(split1_9_to))]))
    add(split1_9, mode=Mode.SUBTRACT)


solid = Compound([part.part, body_2.part])
